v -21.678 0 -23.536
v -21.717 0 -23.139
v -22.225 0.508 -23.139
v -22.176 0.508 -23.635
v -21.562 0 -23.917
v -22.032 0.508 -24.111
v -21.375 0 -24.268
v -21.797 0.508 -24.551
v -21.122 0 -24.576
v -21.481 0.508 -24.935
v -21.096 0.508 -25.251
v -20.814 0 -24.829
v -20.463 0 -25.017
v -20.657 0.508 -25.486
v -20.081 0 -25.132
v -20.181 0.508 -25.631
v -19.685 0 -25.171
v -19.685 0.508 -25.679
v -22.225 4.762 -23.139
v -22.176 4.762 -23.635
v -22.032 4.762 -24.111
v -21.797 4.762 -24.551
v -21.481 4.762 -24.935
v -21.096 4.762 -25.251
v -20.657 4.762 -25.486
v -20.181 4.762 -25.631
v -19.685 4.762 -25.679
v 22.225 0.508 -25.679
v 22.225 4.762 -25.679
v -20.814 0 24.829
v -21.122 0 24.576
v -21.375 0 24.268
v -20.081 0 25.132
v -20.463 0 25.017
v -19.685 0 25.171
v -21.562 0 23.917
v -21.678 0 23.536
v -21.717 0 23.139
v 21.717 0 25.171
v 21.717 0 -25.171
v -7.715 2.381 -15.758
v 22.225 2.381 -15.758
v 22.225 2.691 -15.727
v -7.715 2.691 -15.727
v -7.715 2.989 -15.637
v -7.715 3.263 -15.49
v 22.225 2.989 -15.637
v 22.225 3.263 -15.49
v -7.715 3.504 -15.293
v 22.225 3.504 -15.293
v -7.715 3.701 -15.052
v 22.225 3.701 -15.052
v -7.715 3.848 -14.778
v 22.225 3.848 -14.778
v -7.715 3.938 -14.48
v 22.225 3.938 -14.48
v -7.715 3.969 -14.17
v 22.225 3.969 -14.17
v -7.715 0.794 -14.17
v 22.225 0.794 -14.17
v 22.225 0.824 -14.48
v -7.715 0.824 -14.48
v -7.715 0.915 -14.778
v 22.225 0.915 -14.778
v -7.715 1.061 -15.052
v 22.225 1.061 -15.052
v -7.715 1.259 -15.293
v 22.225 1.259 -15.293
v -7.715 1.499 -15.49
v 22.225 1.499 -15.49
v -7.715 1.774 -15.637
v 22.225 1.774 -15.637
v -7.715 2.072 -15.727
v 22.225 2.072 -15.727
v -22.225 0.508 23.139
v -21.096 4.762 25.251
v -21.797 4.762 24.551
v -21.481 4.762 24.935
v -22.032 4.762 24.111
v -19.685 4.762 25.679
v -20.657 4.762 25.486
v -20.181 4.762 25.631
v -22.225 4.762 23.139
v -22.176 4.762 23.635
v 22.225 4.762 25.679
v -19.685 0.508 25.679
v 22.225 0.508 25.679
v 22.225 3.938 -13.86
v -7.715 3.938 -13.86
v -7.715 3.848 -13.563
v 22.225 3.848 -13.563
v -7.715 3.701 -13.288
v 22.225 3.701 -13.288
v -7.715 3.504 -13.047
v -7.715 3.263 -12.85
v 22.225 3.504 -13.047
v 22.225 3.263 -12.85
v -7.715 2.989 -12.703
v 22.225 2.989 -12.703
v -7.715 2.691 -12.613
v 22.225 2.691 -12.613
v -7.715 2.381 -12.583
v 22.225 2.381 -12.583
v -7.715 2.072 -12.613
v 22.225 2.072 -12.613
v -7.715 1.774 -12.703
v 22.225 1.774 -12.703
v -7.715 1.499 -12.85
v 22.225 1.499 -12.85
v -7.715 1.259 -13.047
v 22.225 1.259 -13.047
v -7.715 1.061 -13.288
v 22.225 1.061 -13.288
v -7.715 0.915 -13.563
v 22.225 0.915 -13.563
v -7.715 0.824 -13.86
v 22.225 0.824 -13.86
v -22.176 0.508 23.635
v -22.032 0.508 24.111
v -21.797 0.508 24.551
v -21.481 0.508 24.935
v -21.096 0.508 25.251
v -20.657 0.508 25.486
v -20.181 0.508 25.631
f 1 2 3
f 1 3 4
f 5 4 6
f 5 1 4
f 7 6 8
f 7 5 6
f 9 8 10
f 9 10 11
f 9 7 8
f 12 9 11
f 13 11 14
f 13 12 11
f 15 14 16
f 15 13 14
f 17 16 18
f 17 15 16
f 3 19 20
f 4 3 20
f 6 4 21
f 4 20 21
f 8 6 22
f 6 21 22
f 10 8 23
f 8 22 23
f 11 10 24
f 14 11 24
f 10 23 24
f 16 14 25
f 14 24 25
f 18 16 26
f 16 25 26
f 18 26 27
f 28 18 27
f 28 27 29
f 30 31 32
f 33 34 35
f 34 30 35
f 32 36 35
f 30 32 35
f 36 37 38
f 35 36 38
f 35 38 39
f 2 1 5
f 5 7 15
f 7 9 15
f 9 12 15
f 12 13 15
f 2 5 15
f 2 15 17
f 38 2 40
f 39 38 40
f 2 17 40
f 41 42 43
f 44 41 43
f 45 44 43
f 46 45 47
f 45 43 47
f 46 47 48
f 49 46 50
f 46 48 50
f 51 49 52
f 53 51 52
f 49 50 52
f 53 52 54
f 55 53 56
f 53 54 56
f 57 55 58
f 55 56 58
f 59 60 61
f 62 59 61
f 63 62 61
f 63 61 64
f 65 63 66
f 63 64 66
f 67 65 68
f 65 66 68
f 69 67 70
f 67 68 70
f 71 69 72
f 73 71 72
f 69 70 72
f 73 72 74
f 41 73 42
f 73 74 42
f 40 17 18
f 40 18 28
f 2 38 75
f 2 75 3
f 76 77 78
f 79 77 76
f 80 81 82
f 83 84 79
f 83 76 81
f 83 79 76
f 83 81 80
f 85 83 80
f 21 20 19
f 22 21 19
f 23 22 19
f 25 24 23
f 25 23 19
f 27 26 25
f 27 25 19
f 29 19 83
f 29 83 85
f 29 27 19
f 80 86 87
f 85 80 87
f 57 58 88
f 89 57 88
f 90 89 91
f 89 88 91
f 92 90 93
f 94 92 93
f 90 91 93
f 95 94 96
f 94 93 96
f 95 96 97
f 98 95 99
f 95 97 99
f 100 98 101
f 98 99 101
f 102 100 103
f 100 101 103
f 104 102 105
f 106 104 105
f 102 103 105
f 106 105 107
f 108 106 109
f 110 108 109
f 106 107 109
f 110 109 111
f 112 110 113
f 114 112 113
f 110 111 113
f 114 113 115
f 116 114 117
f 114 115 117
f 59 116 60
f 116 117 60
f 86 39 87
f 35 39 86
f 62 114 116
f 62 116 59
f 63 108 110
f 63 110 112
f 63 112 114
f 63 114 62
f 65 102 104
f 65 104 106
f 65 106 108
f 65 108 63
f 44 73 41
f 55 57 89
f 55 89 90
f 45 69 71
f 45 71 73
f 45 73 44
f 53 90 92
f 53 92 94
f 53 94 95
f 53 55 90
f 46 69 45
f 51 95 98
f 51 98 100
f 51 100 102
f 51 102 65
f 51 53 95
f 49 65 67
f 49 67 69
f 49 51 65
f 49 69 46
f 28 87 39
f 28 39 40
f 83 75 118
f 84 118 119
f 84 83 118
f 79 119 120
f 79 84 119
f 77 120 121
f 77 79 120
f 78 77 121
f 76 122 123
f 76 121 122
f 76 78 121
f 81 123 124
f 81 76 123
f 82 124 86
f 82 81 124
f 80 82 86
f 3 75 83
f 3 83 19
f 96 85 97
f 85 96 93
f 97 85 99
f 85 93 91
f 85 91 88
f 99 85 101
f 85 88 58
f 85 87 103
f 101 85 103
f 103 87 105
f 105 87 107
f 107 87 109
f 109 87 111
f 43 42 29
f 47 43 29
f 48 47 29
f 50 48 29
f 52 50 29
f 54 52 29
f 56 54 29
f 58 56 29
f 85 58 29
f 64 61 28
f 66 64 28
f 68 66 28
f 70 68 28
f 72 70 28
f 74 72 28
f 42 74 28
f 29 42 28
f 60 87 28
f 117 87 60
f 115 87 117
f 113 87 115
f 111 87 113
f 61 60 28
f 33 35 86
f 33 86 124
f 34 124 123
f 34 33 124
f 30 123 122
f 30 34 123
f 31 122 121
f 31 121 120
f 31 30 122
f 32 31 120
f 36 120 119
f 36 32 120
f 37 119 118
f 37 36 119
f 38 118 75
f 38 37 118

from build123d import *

# Parameters (mm, degrees)
SKETCH1_W           = 44.45
SKETCH1_H           = 51.3588
BOSS_EXTRUDE1_DEPTH = 4.7625
CUT_EXTRUDE1_DEPTH  = 29.94025
FILLET1_R           = 2.54
CHAMFER1_SIZE       = 0.508


with BuildPart() as part:
    # Sketch1 → Boss-Extrude1 (new body)
    with BuildSketch(Plane(origin=(0, 0, 0), x_dir=(1, 0, 0), z_dir=(0, 1, 0))):
        Rectangle(SKETCH1_W, SKETCH1_H)
    extrude(amount=BOSS_EXTRUDE1_DEPTH)

    # Sketch2 → Cut-Extrude1 (cut)
    with BuildSketch(Plane(origin=(22.225, 0, 0), x_dir=(0, 0, -1), z_dir=(1, 0, 0))):
        with BuildLine():
            ThreePointArc((15.757525, 2.38125), (15.292557015, 3.503782015), (14.170025, 3.96875))
            Line((14.170025, 3.96875), (14.170025, 0.79375))
            ThreePointArc((14.170025, 0.79375), (15.292557015, 1.258717985), (15.757525, 2.38125))
        make_face()
        with BuildLine():
            Line((14.170025, 0.79375), (14.170025, 3.96875))
            ThreePointArc((14.170025, 3.96875), (12.582525, 2.38125), (14.170025, 0.79375))
        make_face()
    extrude(amount=-CUT_EXTRUDE1_DEPTH, mode=Mode.SUBTRACT)

    # Fillet1
    fillet1_edges = [part.edges().sort_by_distance(p)[0] for p in [
        (-22.225, 2.38125, -25.6794),
        (-22.225, 2.38125, 25.6794),
    ]]
    fillet(fillet1_edges, radius=FILLET1_R)

    # Chamfer1
    chamfer1_edges = [part.edges().sort_by_distance(p)[0] for p in [
        (-22.225, 0, 0),
        (1.27, 0, 25.6794),
        (-21.481051224, 0, 24.935451224),
        (-21.481051224, 0, -24.935451224),
        (1.27, 0, -25.6794),
        (22.225, 0, 0),
    ]]
    chamfer(chamfer1_edges, length=CHAMFER1_SIZE)


solid = part.part
